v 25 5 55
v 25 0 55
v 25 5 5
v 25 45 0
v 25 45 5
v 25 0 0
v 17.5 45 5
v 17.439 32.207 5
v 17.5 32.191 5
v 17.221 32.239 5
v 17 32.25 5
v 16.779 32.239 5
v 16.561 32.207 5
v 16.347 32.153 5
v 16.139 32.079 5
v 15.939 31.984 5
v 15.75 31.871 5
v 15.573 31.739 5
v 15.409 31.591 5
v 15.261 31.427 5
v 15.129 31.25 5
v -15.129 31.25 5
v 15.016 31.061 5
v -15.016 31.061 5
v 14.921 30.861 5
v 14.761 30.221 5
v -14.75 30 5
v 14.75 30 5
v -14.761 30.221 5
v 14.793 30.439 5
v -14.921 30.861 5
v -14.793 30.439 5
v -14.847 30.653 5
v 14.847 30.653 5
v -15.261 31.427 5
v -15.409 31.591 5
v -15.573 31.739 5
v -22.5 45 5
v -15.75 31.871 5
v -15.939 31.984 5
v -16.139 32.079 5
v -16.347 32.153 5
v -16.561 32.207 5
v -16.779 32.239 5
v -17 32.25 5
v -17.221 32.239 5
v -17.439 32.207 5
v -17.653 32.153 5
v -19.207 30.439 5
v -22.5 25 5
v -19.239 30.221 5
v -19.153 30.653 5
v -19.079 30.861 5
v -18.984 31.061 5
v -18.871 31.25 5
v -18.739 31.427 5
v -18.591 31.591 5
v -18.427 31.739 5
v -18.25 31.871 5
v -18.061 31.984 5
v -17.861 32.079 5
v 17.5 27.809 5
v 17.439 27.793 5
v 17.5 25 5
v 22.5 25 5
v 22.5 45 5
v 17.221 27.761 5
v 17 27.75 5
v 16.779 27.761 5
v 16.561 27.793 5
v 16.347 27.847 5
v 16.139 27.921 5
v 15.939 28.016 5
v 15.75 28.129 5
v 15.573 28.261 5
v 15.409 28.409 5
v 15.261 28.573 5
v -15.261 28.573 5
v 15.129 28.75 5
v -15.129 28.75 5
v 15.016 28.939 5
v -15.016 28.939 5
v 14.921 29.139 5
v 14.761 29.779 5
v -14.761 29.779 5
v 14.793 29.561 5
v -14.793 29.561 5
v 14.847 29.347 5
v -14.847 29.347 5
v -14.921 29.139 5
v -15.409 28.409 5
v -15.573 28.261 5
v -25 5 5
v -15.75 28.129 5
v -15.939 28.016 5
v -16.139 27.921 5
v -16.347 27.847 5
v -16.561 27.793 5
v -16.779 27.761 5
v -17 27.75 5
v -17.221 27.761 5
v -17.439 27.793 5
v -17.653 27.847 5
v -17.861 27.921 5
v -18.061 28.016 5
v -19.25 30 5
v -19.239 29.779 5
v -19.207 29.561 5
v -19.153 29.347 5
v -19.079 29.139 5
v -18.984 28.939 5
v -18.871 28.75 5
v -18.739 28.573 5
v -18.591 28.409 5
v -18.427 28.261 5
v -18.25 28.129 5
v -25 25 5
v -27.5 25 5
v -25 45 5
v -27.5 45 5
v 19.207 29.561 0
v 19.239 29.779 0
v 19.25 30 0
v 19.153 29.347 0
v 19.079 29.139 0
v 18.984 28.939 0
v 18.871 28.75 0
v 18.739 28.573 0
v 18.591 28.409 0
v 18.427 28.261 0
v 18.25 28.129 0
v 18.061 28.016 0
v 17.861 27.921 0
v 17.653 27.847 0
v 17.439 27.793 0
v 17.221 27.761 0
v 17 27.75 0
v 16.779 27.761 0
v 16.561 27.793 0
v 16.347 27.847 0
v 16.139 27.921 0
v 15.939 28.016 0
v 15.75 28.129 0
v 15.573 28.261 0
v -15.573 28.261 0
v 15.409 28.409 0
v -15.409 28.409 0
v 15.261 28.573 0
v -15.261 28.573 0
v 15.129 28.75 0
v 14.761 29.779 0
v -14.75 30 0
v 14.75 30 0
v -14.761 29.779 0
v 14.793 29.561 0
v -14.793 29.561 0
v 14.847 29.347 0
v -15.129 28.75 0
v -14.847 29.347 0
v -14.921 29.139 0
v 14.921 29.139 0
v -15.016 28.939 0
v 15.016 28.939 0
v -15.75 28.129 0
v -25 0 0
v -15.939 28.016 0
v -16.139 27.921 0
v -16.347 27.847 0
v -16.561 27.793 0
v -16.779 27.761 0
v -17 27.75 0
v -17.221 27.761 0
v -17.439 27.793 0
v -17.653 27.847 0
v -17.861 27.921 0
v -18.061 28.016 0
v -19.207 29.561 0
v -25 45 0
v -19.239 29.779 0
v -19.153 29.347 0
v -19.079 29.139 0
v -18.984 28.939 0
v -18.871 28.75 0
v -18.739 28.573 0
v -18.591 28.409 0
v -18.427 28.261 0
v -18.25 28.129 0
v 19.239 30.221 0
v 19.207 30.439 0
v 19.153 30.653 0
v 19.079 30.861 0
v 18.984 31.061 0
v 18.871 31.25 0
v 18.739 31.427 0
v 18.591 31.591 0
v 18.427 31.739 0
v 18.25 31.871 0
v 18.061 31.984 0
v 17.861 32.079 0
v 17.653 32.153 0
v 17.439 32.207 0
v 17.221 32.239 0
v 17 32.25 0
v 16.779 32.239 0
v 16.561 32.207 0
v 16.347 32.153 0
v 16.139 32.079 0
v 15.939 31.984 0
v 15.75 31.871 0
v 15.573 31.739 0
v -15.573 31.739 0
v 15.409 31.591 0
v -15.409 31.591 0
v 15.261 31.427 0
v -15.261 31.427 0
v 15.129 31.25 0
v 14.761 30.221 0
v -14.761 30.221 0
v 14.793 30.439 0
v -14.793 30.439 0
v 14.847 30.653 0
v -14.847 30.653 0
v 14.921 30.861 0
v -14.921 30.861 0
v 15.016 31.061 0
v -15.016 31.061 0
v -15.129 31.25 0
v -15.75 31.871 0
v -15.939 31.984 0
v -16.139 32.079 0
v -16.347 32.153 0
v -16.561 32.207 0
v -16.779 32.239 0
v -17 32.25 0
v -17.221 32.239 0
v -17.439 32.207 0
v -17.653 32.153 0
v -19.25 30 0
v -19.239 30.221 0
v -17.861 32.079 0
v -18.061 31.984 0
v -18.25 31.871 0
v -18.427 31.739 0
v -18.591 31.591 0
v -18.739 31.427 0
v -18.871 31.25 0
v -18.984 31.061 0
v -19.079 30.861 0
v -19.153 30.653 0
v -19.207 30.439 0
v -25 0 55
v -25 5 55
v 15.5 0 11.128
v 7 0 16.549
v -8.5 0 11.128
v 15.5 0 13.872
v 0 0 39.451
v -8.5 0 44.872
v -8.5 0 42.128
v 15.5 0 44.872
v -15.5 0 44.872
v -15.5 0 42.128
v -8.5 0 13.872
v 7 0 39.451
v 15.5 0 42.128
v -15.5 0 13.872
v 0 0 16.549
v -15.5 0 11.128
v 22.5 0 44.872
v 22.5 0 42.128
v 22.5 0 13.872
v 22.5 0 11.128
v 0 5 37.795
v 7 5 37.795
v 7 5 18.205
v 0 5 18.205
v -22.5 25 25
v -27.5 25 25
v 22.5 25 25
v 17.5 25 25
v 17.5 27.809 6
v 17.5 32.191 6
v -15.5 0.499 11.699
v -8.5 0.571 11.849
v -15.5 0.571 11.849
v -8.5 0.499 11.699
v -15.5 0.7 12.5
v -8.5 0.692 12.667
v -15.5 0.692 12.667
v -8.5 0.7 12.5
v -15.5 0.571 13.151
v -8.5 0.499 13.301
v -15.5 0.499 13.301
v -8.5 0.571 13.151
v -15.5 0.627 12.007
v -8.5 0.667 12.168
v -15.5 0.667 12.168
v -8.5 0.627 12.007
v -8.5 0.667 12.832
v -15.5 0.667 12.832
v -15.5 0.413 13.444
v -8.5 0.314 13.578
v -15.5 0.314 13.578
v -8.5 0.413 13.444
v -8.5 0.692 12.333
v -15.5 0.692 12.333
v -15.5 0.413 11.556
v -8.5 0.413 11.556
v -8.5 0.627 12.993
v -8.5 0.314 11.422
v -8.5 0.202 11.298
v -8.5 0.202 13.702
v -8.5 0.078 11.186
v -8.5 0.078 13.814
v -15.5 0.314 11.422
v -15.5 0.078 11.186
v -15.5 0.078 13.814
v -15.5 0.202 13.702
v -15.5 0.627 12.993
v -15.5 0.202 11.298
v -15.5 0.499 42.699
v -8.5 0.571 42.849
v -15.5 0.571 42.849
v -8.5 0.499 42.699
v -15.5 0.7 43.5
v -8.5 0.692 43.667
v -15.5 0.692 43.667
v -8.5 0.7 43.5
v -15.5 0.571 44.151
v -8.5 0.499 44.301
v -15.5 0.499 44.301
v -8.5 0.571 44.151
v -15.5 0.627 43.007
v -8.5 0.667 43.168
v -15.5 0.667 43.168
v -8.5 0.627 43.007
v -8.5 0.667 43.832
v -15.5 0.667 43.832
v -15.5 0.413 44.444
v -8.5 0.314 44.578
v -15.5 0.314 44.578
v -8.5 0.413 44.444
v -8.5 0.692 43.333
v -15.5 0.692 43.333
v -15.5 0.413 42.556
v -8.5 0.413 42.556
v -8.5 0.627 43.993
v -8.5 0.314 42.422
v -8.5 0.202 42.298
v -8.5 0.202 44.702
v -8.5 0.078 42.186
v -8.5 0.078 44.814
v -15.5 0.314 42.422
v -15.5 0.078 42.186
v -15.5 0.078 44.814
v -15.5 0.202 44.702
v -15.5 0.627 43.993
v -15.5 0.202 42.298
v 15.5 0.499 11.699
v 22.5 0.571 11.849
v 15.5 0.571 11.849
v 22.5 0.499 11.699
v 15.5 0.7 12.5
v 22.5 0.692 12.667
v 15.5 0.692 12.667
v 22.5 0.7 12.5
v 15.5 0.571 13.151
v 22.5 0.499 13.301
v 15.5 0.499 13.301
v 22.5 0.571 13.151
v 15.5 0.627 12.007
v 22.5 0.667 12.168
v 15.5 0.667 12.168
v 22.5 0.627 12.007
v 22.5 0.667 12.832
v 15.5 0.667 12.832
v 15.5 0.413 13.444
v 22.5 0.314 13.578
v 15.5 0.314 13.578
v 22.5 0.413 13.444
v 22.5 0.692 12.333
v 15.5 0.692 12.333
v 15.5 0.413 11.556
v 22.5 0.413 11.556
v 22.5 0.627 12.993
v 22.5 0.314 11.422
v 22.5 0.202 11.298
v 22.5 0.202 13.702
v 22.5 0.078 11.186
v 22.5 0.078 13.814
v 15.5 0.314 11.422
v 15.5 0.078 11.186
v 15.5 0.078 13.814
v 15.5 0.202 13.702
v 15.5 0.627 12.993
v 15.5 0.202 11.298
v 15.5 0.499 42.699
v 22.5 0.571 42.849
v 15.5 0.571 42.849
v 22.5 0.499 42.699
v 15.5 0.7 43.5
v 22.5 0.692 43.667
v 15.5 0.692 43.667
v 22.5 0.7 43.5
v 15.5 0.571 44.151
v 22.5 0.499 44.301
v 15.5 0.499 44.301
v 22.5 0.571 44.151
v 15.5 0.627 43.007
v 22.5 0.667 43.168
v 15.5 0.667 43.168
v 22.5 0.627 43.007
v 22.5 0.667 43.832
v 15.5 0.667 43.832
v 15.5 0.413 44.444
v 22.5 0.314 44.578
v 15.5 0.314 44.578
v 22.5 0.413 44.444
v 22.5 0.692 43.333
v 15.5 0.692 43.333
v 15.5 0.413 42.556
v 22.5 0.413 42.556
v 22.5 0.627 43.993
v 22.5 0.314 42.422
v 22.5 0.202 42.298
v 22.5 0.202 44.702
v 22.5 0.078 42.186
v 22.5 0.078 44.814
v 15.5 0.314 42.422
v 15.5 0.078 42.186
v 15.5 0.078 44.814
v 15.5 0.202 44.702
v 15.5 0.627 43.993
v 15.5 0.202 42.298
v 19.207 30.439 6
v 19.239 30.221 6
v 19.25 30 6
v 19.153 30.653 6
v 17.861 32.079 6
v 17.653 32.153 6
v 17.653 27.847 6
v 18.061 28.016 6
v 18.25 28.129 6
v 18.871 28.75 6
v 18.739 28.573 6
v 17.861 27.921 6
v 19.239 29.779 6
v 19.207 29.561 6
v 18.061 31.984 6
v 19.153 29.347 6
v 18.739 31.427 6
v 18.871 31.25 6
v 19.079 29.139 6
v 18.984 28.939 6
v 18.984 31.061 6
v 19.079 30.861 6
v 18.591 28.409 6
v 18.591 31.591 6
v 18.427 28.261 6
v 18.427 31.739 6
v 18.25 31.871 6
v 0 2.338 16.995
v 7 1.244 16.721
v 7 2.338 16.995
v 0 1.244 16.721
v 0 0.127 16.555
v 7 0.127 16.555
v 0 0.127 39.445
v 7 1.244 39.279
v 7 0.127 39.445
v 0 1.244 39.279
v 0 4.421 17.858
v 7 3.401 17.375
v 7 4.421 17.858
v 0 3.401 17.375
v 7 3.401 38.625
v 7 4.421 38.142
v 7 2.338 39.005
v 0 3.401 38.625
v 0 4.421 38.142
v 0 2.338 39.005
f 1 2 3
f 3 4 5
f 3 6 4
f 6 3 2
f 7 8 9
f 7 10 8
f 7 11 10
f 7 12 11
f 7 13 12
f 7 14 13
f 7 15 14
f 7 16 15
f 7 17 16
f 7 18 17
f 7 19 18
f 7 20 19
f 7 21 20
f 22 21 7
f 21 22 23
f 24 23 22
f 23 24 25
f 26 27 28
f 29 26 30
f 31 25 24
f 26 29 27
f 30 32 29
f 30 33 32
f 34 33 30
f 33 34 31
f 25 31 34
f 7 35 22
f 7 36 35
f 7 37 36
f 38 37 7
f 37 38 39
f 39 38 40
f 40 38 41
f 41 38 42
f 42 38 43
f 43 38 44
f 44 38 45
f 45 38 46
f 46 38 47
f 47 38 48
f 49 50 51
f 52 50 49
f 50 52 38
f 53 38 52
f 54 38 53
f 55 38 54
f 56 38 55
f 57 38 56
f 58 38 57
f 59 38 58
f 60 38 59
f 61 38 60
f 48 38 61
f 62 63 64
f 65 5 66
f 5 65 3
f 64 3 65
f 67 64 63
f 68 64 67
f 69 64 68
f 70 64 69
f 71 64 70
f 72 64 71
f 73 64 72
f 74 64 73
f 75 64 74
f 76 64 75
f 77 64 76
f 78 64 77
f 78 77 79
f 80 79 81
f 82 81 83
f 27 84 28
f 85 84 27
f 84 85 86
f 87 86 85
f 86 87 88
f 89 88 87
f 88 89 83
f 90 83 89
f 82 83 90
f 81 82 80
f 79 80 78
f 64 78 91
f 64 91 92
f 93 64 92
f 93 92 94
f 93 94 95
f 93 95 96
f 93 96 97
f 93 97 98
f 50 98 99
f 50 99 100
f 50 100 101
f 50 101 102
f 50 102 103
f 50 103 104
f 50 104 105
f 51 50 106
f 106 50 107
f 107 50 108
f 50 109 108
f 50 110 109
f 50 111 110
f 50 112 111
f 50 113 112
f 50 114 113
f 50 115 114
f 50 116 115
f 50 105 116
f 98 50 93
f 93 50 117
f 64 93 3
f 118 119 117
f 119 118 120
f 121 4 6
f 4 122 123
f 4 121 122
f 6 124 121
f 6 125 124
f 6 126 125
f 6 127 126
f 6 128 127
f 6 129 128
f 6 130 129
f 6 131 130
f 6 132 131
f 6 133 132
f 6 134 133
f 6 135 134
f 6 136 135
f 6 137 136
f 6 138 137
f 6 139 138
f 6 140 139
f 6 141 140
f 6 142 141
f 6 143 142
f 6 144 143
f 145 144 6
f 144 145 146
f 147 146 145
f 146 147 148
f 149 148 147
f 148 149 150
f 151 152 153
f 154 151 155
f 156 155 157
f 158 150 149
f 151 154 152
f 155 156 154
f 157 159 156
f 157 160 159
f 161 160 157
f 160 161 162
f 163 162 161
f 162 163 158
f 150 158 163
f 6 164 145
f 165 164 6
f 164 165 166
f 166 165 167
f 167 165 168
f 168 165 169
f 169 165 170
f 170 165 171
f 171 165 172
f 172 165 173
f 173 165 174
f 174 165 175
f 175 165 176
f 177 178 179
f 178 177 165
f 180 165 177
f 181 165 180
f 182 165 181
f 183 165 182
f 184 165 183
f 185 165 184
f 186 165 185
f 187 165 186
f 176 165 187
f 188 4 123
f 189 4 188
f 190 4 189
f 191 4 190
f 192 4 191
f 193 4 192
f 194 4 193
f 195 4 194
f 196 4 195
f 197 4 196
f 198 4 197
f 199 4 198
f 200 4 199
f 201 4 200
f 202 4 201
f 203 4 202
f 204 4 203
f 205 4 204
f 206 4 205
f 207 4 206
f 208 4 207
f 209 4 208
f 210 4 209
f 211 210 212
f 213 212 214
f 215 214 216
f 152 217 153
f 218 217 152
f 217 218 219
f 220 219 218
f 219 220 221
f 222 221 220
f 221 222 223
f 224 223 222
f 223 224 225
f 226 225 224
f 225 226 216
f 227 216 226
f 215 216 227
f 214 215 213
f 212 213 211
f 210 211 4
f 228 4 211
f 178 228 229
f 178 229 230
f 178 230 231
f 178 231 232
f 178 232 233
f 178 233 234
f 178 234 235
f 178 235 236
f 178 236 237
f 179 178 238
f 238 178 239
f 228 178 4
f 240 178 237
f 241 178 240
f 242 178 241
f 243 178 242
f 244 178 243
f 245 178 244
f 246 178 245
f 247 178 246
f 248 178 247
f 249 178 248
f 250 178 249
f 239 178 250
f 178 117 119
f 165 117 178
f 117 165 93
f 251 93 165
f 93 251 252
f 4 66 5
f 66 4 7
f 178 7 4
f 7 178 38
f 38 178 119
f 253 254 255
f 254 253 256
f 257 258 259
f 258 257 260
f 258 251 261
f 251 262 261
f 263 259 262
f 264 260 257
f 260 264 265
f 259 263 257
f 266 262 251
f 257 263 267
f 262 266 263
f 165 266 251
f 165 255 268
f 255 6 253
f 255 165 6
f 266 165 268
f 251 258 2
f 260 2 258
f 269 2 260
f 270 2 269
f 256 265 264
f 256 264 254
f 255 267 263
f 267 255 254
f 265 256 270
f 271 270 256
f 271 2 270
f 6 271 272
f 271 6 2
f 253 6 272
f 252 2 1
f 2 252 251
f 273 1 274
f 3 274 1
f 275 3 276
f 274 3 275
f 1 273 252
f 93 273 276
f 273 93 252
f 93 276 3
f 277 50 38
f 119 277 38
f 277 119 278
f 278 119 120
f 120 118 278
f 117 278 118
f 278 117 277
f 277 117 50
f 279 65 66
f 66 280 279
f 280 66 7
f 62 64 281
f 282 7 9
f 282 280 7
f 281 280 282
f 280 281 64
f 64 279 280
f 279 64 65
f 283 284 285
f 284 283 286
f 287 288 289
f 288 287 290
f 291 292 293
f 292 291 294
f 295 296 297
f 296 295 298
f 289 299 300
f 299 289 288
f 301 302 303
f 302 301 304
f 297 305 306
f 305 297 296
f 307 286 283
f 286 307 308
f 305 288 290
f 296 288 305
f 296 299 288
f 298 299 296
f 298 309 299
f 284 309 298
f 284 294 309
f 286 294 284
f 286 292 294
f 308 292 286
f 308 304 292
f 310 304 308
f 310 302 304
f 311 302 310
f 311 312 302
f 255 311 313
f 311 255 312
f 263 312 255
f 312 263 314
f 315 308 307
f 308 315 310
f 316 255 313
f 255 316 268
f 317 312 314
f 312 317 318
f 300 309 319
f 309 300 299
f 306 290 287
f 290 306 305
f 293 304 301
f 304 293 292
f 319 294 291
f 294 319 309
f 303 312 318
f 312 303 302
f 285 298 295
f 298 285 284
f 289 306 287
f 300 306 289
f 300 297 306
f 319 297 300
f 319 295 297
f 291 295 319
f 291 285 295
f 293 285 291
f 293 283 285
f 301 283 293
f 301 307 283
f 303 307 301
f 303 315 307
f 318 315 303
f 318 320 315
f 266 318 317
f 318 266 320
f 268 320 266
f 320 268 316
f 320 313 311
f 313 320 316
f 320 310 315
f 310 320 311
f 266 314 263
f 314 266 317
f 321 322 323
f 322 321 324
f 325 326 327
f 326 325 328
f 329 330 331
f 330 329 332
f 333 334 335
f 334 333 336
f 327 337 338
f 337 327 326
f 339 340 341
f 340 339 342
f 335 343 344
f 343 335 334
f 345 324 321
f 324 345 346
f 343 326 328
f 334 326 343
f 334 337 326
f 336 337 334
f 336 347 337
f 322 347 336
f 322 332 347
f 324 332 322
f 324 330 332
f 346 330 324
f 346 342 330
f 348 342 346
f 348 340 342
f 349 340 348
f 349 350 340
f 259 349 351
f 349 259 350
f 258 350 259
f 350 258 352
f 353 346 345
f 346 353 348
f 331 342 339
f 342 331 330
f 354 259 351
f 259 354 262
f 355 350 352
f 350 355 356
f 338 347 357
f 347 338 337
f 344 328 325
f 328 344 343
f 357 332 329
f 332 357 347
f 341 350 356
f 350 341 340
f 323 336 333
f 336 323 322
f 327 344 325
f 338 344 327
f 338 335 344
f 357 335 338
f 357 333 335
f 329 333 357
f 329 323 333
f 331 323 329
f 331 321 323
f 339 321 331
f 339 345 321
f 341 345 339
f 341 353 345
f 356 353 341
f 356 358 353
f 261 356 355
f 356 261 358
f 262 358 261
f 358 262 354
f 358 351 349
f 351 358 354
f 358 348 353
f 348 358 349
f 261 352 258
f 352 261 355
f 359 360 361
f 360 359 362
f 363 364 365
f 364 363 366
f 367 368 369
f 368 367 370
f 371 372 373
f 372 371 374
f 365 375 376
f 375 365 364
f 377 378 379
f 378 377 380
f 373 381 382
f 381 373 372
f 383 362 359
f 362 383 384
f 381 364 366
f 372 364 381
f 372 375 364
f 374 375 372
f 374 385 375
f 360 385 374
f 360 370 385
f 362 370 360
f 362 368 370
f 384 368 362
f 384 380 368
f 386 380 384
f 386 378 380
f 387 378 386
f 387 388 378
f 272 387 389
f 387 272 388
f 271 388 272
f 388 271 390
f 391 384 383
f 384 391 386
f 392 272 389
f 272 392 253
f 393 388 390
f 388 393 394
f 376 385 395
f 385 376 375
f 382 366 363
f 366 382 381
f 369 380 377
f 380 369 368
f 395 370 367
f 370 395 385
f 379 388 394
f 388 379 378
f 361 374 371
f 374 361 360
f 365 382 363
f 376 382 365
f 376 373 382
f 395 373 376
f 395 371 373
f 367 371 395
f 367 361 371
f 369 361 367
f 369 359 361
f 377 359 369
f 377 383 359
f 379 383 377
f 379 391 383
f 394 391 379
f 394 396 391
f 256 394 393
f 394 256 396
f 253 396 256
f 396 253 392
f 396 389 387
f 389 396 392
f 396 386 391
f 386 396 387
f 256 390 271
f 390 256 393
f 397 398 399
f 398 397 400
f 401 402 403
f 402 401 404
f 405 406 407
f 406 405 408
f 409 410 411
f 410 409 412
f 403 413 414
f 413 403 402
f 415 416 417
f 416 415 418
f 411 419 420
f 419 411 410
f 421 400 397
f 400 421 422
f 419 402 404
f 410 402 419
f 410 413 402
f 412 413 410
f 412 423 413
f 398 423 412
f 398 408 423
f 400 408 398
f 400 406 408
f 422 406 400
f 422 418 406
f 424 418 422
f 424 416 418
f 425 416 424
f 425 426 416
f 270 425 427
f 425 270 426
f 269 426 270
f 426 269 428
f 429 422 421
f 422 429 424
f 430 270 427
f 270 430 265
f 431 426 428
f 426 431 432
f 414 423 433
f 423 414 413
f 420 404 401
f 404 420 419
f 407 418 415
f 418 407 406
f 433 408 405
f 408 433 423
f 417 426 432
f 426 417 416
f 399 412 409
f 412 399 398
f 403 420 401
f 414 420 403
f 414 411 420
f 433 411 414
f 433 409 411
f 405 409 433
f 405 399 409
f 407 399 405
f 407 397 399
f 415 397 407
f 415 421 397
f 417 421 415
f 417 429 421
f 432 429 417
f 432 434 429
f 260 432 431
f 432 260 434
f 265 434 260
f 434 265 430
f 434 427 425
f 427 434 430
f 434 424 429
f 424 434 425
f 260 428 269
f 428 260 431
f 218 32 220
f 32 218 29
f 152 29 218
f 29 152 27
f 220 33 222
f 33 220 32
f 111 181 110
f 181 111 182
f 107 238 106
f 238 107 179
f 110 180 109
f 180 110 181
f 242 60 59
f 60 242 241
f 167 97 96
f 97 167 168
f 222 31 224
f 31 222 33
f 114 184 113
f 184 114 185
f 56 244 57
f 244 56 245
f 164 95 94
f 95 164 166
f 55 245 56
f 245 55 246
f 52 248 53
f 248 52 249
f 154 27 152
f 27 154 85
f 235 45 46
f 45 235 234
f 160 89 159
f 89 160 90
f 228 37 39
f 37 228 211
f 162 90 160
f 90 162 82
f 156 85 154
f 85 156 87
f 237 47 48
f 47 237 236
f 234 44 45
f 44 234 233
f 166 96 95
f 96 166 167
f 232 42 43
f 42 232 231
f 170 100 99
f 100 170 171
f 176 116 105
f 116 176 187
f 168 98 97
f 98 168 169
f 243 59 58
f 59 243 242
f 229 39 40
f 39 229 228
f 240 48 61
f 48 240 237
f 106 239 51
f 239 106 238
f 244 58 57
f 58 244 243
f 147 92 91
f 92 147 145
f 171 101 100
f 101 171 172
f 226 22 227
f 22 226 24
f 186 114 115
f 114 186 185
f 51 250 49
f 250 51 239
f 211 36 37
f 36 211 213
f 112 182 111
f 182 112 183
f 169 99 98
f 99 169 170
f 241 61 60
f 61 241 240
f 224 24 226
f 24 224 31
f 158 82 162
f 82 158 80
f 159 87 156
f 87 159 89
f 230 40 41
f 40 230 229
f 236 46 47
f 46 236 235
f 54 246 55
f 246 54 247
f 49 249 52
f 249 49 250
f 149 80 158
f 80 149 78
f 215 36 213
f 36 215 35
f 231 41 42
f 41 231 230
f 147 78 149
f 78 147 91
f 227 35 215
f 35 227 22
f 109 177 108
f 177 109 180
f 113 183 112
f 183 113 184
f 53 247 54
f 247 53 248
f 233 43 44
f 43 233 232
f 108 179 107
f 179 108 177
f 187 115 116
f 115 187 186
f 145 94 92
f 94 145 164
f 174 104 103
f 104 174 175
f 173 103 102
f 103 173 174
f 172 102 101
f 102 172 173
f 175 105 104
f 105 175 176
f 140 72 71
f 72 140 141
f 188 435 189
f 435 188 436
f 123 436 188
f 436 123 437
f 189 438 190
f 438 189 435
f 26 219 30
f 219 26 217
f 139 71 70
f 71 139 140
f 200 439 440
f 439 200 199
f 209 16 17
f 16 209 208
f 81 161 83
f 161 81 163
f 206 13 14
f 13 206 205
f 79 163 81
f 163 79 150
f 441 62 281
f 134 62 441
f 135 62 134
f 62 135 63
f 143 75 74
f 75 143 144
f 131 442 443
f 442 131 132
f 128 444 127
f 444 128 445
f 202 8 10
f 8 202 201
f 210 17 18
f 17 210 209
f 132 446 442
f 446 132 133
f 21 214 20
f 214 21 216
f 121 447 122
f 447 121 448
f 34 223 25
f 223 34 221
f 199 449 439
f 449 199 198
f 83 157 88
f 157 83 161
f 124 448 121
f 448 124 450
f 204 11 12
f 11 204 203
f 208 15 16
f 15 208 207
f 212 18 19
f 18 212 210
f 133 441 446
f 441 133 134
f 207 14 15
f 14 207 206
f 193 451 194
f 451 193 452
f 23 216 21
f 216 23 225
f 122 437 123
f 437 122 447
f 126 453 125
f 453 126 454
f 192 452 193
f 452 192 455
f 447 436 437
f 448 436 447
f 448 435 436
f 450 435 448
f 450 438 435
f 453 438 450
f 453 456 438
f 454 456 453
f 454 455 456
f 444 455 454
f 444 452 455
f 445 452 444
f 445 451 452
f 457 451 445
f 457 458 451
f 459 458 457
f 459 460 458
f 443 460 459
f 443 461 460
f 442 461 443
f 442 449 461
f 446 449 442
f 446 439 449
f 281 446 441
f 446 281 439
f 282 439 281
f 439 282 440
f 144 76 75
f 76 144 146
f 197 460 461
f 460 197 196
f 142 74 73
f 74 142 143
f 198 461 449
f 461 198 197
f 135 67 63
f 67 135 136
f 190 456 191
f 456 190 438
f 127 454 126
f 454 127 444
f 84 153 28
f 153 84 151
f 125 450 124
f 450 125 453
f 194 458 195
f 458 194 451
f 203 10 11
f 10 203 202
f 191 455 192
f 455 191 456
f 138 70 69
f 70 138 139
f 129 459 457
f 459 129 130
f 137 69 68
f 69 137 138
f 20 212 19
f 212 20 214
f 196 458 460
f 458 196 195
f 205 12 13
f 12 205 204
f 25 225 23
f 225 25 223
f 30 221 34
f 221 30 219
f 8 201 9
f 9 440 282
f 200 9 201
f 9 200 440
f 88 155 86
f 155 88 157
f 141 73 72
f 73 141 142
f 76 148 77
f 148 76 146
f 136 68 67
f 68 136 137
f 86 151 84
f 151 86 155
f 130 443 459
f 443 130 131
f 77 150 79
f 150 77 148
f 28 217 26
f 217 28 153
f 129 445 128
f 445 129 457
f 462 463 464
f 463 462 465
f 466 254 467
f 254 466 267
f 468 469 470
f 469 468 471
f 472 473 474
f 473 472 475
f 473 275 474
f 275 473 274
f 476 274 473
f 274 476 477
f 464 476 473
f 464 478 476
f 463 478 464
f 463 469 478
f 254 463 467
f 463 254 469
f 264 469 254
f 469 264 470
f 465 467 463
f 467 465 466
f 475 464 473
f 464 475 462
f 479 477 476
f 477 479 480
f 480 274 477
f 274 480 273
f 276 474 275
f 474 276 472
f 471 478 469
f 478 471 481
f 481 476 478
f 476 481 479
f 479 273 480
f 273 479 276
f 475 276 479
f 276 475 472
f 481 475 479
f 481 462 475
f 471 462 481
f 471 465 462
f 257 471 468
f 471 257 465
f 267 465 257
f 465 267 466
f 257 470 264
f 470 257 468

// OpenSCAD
// L-shaped NEMA 17 Stepper Motor Mounting Bracket - FINAL CORRECTED
// Designed for a syringe pump application.

// --- Dimensions ---
// Base Plate
base_x_size    = 50; // -25 to 25
base_y_size    = 45; // 0 to 45
base_z_size    = 5;  // 0 to 5

// Base Plate Holes (M4)
m4_hole_d     = 4.5;
m4_hole_x1    = -17;
m4_hole_y1    = 30;
m4_hole_x2    = 17;
m4_hole_y2    = 30;

// Vertical Motor Plate
vert_x_size    = 50; // -25 to 25
vert_y_size    = 5;  // 0 to 5
vert_z_size    = 50; // 5 to 55

// Motor Boss Hole (Centering)
boss_d        = 23;
boss_x        = 0;
boss_z        = 28;

// M3 Screw Holes (Pattern)
m3_hole_d     = 3.4;
m3_pattern_s  = 31; 

// Gussets
gusset_thick   = 5;
gusset_leg_y   = 20;
gusset_leg_z   = 20;

$fn = 64;

// --- Helper Modules ---

module gusset_shape() {
    // Right triangle in YZ plane
    polygon(points=[[0, 0], [gusset_leg_y, 0], [0, gusset_leg_z]]);
}

// --- Main Assembly ---

difference() {
    union() {
        // Base Plate
        // Centered on X, Y starts at 0, Z starts at 0
        translate([0, base_y_size/2, base_z_size/2])
            cube([base_x_size, base_y_size, base_z_size], center = true);

        // Vertical Motor Plate
        // Centered on X, Y starts at 0, Z starts at 5
        translate([0, vert_y_size/2, (vert_z_size/2) + 5])
            cube([vert_x_size, vert_y_size, vert_z_size], center = true);

        // Gusset Left (Flush with X = -25)
        translate([-base_x_size/2 + gusset_thick/2, base_y_size - gusset_leg_y, 5])
            rotate([0, -90, 0])
            linear_extrude(height = gusset_thick)
            gusset_shape();

        // Gusset Right (Flush with X = 25)
        translate([base_x_size/2 - gusset_thick/2, base_y_size - gusset_leg_y, 5])
            rotate([0, -90, 0])
            linear_extrude(height = gusset_thick)
            gusset_shape();
    }

    // --- Negative Geometry (Cuts) ---

    // M4 Holes in Base Plate
    translate([m4_hole_x1, m4_hole_y1, -1]) 
        cylinder(h = base_z_size + 2, d = m4_hole_d);
    translate([m4_hole_x2, m4_hole_y2, -1]) 
        cylinder(h = base_z_size + 2, d = m4_hole_d);

    // Motor Boss Hole (through the vertical plate along Y)
    translate([boss_x, -1, boss_z])
        rotate([0, 90, 0])
        cylinder(h = vert_y_size + 2, d = boss_d);

    // M3 Screw Holes (4 holes in a 31mm square pattern)
    // Pattern is in X and Z plane.
    for (sx = [-1, 1], sz = [-1, 1]) {
        translate([sx * (m3_pattern_s / 2), -1, boss_z + sz * (m3_pattern_s / 2)])
            rotate([0, 90, 0])
            cylinder(h = vert_y_size + 2, d = m3_hole_d);
    }
}
